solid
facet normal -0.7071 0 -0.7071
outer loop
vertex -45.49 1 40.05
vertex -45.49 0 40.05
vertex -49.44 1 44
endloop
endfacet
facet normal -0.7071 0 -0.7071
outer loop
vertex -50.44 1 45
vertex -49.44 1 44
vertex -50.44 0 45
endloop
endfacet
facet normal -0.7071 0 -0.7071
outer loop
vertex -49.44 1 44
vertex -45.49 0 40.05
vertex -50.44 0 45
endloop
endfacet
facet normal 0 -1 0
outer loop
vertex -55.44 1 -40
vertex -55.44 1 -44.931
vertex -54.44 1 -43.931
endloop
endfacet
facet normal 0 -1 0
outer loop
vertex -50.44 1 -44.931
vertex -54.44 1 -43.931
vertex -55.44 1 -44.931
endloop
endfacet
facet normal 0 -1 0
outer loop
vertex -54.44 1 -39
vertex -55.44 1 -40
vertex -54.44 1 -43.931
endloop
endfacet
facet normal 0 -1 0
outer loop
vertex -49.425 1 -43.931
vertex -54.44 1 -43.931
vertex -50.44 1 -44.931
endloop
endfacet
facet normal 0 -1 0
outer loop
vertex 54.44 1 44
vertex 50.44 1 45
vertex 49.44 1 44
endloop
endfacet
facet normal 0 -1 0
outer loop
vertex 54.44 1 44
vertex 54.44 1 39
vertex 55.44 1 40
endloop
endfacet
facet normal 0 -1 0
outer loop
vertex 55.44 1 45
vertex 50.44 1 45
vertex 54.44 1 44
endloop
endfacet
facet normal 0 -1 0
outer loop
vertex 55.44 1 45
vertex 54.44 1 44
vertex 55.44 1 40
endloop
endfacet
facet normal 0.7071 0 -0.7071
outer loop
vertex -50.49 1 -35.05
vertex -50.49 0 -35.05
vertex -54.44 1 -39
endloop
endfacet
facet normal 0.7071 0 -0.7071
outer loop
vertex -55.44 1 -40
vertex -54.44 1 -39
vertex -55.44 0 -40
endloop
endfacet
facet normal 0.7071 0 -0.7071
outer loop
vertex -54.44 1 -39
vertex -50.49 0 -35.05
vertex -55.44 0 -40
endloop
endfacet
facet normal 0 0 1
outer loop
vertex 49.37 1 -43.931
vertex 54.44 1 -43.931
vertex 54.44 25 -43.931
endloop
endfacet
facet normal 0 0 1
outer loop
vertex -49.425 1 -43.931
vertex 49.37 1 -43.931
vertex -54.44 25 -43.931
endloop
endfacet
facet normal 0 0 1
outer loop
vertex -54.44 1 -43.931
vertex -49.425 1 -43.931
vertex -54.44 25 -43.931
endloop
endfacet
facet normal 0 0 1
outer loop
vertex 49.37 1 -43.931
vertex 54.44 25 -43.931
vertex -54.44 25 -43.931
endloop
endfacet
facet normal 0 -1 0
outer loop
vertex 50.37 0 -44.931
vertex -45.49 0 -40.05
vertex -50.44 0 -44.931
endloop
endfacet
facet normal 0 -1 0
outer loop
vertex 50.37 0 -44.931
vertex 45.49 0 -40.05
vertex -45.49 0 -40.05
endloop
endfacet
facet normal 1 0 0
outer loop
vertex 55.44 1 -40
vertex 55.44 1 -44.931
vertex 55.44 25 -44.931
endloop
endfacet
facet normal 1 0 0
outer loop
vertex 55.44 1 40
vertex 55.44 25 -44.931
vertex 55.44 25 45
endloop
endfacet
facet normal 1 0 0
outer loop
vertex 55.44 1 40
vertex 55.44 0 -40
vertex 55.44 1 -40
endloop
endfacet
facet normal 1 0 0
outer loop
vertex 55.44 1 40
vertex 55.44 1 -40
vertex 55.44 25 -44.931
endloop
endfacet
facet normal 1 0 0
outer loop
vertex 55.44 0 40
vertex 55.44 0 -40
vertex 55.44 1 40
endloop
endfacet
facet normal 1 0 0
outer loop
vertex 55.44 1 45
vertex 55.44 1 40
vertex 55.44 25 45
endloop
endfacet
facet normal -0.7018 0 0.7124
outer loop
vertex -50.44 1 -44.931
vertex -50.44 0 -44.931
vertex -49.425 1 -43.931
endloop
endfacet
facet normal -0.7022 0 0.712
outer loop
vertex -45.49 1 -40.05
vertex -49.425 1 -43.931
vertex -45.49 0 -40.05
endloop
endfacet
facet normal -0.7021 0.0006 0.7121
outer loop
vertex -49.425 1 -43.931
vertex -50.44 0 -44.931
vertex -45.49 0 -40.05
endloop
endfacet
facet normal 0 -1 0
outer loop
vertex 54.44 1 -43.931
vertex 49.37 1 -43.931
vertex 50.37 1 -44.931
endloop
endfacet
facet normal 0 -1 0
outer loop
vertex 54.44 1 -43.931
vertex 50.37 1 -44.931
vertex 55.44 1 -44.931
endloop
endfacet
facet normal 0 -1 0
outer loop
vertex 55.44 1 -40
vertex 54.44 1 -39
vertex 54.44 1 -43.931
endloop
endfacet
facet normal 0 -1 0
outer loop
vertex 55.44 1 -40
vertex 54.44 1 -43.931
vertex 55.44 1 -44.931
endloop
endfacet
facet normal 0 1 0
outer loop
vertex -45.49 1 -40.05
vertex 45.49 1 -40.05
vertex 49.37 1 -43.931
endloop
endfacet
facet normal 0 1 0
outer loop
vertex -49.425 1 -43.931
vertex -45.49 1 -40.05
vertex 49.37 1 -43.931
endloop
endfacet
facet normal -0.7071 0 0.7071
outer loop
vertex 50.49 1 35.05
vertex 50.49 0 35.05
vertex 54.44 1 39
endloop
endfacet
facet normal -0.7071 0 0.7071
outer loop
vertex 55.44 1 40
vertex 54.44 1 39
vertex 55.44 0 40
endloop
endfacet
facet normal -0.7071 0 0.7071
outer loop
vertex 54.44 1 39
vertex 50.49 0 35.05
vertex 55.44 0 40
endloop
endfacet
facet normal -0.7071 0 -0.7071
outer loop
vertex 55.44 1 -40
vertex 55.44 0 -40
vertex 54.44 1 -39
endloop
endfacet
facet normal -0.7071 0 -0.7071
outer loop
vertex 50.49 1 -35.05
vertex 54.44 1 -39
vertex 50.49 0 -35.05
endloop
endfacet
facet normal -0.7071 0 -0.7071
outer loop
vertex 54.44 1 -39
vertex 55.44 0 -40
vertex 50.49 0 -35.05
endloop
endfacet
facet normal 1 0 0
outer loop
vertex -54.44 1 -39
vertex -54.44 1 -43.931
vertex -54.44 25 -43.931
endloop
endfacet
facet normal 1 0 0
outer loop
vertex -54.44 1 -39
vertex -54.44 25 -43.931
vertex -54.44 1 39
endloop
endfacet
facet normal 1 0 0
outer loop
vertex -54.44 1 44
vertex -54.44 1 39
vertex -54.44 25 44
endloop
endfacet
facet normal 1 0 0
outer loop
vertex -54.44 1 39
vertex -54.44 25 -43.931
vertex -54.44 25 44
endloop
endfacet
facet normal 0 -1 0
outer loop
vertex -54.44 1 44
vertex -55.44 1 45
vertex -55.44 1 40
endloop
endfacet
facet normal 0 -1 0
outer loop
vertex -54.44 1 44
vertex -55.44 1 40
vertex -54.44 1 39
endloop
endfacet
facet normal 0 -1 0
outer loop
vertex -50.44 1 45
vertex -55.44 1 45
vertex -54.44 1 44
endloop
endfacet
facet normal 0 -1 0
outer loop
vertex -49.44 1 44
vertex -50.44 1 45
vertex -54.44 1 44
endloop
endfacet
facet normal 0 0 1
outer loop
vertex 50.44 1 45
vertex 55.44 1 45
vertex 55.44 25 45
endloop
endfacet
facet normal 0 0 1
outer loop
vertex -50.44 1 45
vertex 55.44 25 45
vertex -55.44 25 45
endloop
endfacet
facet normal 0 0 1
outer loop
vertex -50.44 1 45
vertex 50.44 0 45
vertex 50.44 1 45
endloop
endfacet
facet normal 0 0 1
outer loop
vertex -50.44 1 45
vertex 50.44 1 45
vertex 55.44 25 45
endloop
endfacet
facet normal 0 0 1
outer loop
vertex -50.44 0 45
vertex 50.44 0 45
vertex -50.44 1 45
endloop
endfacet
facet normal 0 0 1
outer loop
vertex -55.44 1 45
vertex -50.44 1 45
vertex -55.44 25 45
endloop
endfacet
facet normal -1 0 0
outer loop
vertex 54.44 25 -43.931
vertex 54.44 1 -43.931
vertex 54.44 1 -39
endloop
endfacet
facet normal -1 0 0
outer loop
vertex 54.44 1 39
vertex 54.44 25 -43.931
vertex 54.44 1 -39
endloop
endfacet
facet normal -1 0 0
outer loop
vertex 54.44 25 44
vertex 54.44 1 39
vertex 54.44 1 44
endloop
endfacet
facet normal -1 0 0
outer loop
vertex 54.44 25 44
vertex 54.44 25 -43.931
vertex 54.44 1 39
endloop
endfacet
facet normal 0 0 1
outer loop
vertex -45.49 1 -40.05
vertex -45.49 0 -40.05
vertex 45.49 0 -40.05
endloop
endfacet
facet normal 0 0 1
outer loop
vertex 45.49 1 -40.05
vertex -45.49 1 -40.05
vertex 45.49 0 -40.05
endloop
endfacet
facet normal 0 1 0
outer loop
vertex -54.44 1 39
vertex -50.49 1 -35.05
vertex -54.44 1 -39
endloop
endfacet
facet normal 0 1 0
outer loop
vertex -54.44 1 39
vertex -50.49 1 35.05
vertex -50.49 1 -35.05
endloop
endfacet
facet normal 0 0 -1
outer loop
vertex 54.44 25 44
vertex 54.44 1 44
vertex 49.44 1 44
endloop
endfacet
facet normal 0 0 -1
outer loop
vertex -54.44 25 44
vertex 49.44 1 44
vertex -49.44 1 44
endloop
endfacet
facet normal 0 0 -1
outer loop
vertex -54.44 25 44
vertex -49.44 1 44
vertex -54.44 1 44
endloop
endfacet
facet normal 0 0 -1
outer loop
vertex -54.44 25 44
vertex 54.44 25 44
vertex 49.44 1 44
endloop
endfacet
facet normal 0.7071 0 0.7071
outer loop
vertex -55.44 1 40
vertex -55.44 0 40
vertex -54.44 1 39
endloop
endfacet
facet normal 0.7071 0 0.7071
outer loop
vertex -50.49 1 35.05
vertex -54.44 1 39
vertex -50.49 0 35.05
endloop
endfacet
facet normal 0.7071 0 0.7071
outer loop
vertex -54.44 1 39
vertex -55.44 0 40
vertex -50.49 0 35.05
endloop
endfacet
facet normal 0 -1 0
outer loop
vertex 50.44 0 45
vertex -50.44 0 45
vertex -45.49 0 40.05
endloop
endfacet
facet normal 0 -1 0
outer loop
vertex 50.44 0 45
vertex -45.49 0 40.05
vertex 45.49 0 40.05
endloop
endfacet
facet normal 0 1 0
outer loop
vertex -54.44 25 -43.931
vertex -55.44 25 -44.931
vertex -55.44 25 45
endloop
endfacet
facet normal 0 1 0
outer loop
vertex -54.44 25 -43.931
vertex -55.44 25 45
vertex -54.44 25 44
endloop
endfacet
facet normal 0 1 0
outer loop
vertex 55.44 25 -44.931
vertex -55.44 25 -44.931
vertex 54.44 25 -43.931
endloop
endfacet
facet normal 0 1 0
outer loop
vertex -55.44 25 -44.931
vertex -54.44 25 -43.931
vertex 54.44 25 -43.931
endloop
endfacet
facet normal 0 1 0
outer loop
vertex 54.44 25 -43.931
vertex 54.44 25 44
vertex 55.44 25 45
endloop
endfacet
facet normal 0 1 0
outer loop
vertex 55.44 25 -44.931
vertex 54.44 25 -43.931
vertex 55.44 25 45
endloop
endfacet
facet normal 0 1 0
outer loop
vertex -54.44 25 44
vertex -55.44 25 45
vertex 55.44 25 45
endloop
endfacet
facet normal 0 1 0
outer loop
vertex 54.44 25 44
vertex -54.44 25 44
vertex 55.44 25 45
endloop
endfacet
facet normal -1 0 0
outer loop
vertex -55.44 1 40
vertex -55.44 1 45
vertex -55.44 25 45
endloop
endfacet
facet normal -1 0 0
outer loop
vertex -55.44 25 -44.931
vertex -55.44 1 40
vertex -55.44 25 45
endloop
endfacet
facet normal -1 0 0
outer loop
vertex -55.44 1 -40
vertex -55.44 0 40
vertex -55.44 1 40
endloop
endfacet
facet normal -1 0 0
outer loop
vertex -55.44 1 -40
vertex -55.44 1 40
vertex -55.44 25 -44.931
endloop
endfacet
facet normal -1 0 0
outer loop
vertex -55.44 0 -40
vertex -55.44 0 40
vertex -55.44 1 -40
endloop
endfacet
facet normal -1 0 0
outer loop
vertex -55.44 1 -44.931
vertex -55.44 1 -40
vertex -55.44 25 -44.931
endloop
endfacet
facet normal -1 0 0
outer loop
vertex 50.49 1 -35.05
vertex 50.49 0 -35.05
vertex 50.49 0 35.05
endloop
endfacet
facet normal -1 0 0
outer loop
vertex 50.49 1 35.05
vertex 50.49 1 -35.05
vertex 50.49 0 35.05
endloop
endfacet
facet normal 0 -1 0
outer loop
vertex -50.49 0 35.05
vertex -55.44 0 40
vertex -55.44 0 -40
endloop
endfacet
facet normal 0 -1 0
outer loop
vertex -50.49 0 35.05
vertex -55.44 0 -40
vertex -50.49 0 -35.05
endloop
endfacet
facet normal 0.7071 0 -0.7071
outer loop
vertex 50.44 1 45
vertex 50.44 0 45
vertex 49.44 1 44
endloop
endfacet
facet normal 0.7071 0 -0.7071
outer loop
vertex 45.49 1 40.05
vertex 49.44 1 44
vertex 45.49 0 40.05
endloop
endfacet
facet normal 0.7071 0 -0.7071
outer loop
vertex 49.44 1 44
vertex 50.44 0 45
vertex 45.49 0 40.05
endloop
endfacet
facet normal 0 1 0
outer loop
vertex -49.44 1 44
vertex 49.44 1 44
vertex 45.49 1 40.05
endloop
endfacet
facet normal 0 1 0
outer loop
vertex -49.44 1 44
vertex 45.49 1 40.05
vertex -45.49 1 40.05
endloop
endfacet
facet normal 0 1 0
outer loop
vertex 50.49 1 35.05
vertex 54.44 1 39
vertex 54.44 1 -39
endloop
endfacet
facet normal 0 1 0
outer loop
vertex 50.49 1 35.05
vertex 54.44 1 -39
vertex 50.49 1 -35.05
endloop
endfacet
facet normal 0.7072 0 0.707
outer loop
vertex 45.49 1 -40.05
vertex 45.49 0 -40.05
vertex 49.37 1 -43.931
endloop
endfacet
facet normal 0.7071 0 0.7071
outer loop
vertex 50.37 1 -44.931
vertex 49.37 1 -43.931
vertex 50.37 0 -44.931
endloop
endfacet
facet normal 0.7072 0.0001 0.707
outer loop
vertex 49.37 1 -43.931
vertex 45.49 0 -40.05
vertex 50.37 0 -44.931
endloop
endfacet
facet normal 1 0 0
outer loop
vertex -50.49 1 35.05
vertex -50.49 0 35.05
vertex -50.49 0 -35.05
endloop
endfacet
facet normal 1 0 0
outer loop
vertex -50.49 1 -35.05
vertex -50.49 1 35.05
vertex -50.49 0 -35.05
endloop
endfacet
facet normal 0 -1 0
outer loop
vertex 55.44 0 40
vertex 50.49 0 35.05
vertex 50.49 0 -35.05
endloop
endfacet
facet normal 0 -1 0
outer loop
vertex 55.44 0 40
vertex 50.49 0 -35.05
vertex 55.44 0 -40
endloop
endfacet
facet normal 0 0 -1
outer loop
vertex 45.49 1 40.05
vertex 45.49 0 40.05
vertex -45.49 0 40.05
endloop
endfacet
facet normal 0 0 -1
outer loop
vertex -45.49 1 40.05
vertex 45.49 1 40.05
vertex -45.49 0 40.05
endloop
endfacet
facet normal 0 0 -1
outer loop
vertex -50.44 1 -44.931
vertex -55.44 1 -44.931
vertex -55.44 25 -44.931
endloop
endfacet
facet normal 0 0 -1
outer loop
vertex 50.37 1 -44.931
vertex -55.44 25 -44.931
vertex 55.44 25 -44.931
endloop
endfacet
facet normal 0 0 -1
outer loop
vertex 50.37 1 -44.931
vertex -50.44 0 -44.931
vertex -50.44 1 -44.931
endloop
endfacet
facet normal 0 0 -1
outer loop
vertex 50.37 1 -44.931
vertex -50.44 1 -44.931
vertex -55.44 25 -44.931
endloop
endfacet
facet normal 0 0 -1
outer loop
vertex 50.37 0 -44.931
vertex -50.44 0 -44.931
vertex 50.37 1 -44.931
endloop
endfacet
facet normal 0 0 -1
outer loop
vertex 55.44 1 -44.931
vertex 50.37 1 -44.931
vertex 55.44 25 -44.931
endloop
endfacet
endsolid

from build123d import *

# Parameters (mm, degrees)
F1_DEPTH = 25
F2_DEPTH = 1
F3_W     = 108.879238
F3_H     = 87.930533
F4_DEPTH = 24


with BuildPart() as f1:
    # F0 (on Front) → F1 (new body)
    with BuildSketch(Plane.XZ):
        Polygon((-45.439619, 45), (-50.439619, 45), (-45.489871, 40.050253), (45.489871, 40.050253), (50.439619, 45), (3.5, 45), (-3.5, 45), align=None)
        Polygon((-55.439619, 45), (-55.439619, 40), (-50.489871, 35.050253), (-50.489871, -35.050253), (-55.439619, -40), (-55.439619, -44.930533), (-50.439619, -44.930533), (-45.489871, -40.050253), (45.489871, -40.050253), (50.370151, -44.930533), (50.439619, -44.930533), (55.439619, -44.930533), (55.439619, -40), (50.489871, -35.050253), (50.489871, 35.050253), (55.439619, 40), (55.439619, 45), (50.439619, 45), (45.489871, 40.050253), (-45.489871, 40.050253), (-50.439619, 45), align=None)
        Polygon((55.439619, 3.5), (55.439619, 40), (50.489871, 35.050253), (50.489871, -35.050253), (55.439619, -40), (55.439619, -39.930533), (55.439619, -3.5), align=None)
        Polygon((-45.489871, -40.050253), (-50.439619, -44.930533), (-3.5, -44.930533), (3.5, -44.930533), (50.370151, -44.930533), (45.489871, -40.050253), align=None)
        Polygon((-55.439619, 40), (-55.439619, 3.5), (-55.439619, -3.5), (-55.439619, -39.930533), (-55.439619, -40), (-50.489871, -35.050253), (-50.489871, 35.050253), align=None)
    extrude(amount=-F1_DEPTH)

    # F0 (on Front) → F2 (cut)
    with BuildSketch(Plane.XZ):
        Polygon((-55.439619, 45), (-55.439619, 40), (-50.489871, 35.050253), (-50.489871, -35.050253), (-55.439619, -40), (-55.439619, -44.930533), (-50.439619, -44.930533), (-45.489871, -40.050253), (45.489871, -40.050253), (50.370151, -44.930533), (50.439619, -44.930533), (55.439619, -44.930533), (55.439619, -40), (50.489871, -35.050253), (50.489871, 35.050253), (55.439619, 40), (55.439619, 45), (50.439619, 45), (45.489871, 40.050253), (-45.489871, 40.050253), (-50.439619, 45), align=None)
    extrude(amount=-F2_DEPTH, mode=Mode.SUBTRACT)

    # F3 (on face) → F4 (cut)
    with BuildSketch(Plane(origin=(0, 25, 0), x_dir=(-1, 0, 0), z_dir=(0, 1, 0))):
        with Locations((0, 0.034734)):
            Rectangle(F3_W, F3_H)
    extrude(amount=-F4_DEPTH, mode=Mode.SUBTRACT)


solid = f1.part
